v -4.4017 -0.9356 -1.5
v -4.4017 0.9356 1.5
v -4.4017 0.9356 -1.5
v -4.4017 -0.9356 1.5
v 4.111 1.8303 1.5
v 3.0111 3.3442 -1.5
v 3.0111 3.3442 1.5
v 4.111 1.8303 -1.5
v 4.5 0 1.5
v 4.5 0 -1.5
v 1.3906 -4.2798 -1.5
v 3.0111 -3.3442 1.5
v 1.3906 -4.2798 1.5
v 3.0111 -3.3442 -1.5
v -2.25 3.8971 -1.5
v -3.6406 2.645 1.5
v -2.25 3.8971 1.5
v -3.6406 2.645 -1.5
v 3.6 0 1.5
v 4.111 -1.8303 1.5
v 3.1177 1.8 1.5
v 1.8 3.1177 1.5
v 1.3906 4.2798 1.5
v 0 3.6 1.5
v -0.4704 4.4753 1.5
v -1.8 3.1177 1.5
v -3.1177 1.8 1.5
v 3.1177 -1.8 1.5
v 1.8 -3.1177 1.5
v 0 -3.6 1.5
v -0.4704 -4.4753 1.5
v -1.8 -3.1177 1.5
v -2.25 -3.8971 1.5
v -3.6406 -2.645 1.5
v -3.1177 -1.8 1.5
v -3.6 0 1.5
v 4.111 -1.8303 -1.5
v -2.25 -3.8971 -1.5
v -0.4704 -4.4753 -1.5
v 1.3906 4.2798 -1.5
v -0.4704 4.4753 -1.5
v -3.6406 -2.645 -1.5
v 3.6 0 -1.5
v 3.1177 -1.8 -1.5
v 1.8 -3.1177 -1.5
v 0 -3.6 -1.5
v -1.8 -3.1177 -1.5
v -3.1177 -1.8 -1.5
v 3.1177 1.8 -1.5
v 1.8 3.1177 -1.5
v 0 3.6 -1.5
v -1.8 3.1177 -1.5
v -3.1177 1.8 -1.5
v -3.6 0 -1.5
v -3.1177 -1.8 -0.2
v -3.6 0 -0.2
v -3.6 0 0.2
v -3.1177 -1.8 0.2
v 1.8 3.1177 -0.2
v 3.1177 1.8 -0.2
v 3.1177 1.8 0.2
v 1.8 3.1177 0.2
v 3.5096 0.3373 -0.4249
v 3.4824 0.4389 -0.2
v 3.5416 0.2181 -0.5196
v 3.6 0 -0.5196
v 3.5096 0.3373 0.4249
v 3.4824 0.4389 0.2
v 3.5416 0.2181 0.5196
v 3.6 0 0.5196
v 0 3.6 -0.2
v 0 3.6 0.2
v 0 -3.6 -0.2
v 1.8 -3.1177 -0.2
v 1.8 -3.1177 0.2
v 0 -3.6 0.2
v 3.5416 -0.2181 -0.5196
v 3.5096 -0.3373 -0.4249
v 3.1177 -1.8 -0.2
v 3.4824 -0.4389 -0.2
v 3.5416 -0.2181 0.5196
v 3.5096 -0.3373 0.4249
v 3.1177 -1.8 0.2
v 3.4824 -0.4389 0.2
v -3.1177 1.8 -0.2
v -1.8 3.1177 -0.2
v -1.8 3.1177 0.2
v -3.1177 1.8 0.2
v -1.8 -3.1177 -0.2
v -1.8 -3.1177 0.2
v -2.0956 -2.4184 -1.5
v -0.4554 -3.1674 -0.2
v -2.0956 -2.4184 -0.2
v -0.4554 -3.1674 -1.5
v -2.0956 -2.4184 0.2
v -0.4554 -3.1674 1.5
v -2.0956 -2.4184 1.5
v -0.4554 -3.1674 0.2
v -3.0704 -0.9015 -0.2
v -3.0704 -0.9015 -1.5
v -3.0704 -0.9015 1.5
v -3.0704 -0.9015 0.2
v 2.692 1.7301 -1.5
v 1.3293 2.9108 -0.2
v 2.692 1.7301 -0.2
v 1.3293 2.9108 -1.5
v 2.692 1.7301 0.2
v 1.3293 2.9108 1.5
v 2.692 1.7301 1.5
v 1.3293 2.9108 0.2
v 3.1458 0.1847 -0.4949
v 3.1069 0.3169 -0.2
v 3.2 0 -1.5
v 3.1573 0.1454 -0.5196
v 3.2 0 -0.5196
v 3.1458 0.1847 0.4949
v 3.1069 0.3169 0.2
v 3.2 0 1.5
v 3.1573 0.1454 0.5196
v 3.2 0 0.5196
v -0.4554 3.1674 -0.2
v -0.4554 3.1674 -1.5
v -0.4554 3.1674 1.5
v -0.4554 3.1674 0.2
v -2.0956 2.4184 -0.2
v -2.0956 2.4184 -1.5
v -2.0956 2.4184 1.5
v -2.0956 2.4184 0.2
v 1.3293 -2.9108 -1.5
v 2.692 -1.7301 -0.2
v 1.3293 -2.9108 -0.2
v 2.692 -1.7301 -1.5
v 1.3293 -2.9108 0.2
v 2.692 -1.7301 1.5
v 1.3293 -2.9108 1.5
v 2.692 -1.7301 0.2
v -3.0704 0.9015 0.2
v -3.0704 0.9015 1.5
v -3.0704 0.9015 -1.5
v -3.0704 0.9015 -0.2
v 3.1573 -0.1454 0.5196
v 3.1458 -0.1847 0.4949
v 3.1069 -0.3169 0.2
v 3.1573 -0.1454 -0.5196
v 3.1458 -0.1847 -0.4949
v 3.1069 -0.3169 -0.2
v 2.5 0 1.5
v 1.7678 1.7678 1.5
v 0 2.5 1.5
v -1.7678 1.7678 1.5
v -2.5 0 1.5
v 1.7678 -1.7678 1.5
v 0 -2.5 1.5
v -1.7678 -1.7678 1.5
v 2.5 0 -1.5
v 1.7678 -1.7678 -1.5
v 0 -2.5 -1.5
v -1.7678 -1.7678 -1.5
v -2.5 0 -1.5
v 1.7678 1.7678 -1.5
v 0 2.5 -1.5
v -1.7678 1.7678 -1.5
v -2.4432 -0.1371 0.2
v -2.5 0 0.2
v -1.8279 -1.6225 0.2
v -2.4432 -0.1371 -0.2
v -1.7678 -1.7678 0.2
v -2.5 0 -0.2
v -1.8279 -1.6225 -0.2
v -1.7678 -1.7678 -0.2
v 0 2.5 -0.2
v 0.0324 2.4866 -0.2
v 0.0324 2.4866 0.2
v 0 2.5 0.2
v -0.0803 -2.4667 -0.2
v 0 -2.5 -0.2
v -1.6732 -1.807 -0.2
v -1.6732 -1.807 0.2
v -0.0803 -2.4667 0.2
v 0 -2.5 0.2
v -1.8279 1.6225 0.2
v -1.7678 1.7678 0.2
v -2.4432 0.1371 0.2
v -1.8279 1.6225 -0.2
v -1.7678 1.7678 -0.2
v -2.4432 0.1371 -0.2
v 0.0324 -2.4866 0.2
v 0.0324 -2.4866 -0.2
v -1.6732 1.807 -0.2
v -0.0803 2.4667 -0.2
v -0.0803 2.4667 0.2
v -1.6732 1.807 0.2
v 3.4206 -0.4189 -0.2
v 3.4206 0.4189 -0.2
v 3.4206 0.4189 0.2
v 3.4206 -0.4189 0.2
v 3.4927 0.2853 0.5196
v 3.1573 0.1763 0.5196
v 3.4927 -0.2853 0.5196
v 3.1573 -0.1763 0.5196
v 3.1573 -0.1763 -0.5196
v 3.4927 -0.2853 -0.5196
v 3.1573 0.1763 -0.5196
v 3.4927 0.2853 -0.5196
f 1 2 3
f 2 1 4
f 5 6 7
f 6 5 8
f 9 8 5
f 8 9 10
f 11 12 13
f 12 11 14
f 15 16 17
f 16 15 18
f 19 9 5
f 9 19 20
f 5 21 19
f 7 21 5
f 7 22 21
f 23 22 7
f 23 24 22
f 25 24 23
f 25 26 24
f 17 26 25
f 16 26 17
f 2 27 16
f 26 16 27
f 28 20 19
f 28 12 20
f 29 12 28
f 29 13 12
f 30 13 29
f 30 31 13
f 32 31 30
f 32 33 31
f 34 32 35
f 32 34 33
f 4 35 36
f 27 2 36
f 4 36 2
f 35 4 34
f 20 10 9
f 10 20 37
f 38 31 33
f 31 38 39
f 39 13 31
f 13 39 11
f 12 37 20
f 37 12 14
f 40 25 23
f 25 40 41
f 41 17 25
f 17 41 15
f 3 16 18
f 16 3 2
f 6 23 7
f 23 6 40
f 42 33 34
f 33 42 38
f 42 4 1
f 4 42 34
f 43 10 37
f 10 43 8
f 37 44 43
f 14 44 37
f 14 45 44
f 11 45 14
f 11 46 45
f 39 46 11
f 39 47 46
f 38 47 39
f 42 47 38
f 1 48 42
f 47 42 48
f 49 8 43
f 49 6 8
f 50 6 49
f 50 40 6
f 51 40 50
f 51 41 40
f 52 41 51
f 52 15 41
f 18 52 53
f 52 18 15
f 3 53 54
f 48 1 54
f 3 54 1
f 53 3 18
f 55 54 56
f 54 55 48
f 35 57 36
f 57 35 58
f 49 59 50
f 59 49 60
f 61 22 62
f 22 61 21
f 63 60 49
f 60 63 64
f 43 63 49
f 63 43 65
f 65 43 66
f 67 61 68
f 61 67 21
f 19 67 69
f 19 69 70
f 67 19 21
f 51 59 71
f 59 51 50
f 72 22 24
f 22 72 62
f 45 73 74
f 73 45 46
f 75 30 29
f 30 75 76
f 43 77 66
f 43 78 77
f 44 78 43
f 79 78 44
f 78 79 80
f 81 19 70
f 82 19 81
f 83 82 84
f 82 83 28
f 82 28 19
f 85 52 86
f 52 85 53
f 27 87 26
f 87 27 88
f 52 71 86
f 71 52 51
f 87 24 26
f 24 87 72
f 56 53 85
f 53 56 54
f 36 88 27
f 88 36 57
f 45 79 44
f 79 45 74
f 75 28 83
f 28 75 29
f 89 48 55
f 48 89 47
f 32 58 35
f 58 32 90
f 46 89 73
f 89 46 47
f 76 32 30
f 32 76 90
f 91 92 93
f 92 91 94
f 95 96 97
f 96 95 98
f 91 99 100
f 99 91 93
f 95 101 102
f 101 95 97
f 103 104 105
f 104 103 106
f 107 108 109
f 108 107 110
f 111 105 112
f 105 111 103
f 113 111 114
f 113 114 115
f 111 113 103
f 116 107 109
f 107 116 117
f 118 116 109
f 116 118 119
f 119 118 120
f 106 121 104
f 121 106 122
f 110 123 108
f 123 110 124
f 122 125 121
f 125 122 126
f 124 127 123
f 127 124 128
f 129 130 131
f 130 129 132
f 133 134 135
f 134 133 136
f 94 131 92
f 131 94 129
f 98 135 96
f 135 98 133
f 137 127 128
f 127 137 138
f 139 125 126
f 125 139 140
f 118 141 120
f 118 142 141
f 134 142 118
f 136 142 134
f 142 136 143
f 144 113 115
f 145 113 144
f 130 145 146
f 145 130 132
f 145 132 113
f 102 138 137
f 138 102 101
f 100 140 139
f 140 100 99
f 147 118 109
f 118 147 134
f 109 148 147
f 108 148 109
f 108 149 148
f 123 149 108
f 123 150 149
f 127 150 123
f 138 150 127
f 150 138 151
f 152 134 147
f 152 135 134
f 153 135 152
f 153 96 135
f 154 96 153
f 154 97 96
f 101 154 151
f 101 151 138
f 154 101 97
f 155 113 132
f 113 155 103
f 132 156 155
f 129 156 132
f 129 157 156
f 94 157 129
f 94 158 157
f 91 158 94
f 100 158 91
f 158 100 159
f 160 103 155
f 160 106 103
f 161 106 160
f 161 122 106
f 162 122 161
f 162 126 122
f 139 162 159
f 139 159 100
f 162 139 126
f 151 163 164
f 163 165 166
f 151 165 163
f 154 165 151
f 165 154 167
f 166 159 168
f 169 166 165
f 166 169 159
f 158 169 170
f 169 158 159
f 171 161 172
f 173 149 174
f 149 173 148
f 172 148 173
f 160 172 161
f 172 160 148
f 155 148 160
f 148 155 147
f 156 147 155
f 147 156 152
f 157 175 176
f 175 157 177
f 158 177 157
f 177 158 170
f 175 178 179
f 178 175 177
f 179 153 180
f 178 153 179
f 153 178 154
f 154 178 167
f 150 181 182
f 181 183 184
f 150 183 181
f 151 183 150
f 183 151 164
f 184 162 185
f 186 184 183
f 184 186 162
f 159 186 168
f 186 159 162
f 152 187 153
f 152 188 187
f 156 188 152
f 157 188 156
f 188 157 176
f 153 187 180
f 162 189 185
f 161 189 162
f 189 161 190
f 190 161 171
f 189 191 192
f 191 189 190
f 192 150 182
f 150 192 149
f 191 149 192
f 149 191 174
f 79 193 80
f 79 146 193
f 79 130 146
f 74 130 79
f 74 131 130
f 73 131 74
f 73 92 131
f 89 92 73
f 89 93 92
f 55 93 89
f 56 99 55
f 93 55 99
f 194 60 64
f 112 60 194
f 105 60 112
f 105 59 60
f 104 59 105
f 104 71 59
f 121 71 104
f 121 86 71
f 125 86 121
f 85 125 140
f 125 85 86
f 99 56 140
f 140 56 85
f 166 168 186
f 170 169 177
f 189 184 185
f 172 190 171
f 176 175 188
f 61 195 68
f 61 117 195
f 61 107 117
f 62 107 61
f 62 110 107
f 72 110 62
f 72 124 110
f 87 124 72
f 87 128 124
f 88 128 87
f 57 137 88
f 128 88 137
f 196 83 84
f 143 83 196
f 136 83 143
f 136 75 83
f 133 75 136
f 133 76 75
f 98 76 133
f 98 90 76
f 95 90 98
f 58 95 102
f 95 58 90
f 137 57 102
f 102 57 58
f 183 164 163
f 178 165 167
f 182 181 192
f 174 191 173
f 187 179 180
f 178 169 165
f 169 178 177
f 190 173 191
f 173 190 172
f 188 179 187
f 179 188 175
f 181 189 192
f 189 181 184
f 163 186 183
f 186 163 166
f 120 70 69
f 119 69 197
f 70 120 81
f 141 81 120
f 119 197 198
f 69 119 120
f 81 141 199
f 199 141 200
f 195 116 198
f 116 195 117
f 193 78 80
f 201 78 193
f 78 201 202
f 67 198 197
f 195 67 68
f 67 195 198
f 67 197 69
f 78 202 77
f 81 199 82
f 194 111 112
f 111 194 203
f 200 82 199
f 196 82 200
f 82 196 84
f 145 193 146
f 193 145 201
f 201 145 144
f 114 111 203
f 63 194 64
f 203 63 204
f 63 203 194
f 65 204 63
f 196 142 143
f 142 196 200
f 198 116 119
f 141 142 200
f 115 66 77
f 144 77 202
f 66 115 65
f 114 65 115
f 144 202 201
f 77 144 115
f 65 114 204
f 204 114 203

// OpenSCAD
// Parameters
bore_diameter_mm = 5.0; //[2.5:10.0:0.1]
outer_diameter_mm = 9.0; //[4.5:18.0:0.1]
width_mm = 3.0; //[1.5:6.0:0.1]
bore_radius_mm = 2.5; //[1.25:5.0:0.1]
outer_radius_mm = 4.5; //[2.25:9.0:0.1]
eps_mm = 0.2; //[0.05:0.5:0.05]
overlap_mm = 0.8; //[0.5:2.0:0.1]
outer_ring_radial_thickness_mm = 0.9; //[0.5:1.8:0.05]
inner_ring_radial_thickness_mm = 0.7; //[0.4:1.4:0.05]
shield_thickness_mm = 0.4; //[0.2:1.0:0.05]
shield_radial_overlap_mm = 0.6; //[0.3:1.2:0.05]
ball_diameter_mm = 1.2; //[0.6:2.4:0.05]

// Outer Ring
module outer_ring() {
  color("Silver") difference() {
    cylinder(r=outer_radius_mm, h=width_mm, center=true);
    cylinder(r=outer_radius_mm - outer_ring_radial_thickness_mm, h=width_mm + 2*eps_mm, center=true);
  }
}

// Inner Ring
module inner_ring() {
  color("DimGray") difference() {
    cylinder(r=bore_radius_mm + inner_ring_radial_thickness_mm, h=width_mm, center=true);
    cylinder(r=bore_radius_mm, h=width_mm + 2*eps_mm, center=true);
  }
}

// Shield or Seal
module shield_or_seal() {
  color("Black") difference() {
    cylinder(r=outer_radius_mm - outer_ring_radial_thickness_mm + shield_radial_overlap_mm, h=shield_thickness_mm, center=true);
    cylinder(r=bore_radius_mm + inner_ring_radial_thickness_mm - shield_radial_overlap_mm, h=shield_thickness_mm + 2*eps_mm, center=true);
  }
}

// Bearing Ball
module bearing_ball() {
  color("Copper") translate([bore_radius_mm + inner_ring_radial_thickness_mm + ((outer_radius_mm - outer_ring_radial_thickness_mm) - (bore_radius_mm + inner_ring_radial_thickness_mm))/2, 0, 0]) {
    sphere(r=ball_diameter_mm/2);
  }
}

// Ball Bearing Assembly
module ball_bearing() {
  union() {
    outer_ring();
    inner_ring();
    shield_or_seal();
    bearing_ball();
  }
}

// Final Assembly
module assembly() {
  ball_bearing();
}

assembly();
